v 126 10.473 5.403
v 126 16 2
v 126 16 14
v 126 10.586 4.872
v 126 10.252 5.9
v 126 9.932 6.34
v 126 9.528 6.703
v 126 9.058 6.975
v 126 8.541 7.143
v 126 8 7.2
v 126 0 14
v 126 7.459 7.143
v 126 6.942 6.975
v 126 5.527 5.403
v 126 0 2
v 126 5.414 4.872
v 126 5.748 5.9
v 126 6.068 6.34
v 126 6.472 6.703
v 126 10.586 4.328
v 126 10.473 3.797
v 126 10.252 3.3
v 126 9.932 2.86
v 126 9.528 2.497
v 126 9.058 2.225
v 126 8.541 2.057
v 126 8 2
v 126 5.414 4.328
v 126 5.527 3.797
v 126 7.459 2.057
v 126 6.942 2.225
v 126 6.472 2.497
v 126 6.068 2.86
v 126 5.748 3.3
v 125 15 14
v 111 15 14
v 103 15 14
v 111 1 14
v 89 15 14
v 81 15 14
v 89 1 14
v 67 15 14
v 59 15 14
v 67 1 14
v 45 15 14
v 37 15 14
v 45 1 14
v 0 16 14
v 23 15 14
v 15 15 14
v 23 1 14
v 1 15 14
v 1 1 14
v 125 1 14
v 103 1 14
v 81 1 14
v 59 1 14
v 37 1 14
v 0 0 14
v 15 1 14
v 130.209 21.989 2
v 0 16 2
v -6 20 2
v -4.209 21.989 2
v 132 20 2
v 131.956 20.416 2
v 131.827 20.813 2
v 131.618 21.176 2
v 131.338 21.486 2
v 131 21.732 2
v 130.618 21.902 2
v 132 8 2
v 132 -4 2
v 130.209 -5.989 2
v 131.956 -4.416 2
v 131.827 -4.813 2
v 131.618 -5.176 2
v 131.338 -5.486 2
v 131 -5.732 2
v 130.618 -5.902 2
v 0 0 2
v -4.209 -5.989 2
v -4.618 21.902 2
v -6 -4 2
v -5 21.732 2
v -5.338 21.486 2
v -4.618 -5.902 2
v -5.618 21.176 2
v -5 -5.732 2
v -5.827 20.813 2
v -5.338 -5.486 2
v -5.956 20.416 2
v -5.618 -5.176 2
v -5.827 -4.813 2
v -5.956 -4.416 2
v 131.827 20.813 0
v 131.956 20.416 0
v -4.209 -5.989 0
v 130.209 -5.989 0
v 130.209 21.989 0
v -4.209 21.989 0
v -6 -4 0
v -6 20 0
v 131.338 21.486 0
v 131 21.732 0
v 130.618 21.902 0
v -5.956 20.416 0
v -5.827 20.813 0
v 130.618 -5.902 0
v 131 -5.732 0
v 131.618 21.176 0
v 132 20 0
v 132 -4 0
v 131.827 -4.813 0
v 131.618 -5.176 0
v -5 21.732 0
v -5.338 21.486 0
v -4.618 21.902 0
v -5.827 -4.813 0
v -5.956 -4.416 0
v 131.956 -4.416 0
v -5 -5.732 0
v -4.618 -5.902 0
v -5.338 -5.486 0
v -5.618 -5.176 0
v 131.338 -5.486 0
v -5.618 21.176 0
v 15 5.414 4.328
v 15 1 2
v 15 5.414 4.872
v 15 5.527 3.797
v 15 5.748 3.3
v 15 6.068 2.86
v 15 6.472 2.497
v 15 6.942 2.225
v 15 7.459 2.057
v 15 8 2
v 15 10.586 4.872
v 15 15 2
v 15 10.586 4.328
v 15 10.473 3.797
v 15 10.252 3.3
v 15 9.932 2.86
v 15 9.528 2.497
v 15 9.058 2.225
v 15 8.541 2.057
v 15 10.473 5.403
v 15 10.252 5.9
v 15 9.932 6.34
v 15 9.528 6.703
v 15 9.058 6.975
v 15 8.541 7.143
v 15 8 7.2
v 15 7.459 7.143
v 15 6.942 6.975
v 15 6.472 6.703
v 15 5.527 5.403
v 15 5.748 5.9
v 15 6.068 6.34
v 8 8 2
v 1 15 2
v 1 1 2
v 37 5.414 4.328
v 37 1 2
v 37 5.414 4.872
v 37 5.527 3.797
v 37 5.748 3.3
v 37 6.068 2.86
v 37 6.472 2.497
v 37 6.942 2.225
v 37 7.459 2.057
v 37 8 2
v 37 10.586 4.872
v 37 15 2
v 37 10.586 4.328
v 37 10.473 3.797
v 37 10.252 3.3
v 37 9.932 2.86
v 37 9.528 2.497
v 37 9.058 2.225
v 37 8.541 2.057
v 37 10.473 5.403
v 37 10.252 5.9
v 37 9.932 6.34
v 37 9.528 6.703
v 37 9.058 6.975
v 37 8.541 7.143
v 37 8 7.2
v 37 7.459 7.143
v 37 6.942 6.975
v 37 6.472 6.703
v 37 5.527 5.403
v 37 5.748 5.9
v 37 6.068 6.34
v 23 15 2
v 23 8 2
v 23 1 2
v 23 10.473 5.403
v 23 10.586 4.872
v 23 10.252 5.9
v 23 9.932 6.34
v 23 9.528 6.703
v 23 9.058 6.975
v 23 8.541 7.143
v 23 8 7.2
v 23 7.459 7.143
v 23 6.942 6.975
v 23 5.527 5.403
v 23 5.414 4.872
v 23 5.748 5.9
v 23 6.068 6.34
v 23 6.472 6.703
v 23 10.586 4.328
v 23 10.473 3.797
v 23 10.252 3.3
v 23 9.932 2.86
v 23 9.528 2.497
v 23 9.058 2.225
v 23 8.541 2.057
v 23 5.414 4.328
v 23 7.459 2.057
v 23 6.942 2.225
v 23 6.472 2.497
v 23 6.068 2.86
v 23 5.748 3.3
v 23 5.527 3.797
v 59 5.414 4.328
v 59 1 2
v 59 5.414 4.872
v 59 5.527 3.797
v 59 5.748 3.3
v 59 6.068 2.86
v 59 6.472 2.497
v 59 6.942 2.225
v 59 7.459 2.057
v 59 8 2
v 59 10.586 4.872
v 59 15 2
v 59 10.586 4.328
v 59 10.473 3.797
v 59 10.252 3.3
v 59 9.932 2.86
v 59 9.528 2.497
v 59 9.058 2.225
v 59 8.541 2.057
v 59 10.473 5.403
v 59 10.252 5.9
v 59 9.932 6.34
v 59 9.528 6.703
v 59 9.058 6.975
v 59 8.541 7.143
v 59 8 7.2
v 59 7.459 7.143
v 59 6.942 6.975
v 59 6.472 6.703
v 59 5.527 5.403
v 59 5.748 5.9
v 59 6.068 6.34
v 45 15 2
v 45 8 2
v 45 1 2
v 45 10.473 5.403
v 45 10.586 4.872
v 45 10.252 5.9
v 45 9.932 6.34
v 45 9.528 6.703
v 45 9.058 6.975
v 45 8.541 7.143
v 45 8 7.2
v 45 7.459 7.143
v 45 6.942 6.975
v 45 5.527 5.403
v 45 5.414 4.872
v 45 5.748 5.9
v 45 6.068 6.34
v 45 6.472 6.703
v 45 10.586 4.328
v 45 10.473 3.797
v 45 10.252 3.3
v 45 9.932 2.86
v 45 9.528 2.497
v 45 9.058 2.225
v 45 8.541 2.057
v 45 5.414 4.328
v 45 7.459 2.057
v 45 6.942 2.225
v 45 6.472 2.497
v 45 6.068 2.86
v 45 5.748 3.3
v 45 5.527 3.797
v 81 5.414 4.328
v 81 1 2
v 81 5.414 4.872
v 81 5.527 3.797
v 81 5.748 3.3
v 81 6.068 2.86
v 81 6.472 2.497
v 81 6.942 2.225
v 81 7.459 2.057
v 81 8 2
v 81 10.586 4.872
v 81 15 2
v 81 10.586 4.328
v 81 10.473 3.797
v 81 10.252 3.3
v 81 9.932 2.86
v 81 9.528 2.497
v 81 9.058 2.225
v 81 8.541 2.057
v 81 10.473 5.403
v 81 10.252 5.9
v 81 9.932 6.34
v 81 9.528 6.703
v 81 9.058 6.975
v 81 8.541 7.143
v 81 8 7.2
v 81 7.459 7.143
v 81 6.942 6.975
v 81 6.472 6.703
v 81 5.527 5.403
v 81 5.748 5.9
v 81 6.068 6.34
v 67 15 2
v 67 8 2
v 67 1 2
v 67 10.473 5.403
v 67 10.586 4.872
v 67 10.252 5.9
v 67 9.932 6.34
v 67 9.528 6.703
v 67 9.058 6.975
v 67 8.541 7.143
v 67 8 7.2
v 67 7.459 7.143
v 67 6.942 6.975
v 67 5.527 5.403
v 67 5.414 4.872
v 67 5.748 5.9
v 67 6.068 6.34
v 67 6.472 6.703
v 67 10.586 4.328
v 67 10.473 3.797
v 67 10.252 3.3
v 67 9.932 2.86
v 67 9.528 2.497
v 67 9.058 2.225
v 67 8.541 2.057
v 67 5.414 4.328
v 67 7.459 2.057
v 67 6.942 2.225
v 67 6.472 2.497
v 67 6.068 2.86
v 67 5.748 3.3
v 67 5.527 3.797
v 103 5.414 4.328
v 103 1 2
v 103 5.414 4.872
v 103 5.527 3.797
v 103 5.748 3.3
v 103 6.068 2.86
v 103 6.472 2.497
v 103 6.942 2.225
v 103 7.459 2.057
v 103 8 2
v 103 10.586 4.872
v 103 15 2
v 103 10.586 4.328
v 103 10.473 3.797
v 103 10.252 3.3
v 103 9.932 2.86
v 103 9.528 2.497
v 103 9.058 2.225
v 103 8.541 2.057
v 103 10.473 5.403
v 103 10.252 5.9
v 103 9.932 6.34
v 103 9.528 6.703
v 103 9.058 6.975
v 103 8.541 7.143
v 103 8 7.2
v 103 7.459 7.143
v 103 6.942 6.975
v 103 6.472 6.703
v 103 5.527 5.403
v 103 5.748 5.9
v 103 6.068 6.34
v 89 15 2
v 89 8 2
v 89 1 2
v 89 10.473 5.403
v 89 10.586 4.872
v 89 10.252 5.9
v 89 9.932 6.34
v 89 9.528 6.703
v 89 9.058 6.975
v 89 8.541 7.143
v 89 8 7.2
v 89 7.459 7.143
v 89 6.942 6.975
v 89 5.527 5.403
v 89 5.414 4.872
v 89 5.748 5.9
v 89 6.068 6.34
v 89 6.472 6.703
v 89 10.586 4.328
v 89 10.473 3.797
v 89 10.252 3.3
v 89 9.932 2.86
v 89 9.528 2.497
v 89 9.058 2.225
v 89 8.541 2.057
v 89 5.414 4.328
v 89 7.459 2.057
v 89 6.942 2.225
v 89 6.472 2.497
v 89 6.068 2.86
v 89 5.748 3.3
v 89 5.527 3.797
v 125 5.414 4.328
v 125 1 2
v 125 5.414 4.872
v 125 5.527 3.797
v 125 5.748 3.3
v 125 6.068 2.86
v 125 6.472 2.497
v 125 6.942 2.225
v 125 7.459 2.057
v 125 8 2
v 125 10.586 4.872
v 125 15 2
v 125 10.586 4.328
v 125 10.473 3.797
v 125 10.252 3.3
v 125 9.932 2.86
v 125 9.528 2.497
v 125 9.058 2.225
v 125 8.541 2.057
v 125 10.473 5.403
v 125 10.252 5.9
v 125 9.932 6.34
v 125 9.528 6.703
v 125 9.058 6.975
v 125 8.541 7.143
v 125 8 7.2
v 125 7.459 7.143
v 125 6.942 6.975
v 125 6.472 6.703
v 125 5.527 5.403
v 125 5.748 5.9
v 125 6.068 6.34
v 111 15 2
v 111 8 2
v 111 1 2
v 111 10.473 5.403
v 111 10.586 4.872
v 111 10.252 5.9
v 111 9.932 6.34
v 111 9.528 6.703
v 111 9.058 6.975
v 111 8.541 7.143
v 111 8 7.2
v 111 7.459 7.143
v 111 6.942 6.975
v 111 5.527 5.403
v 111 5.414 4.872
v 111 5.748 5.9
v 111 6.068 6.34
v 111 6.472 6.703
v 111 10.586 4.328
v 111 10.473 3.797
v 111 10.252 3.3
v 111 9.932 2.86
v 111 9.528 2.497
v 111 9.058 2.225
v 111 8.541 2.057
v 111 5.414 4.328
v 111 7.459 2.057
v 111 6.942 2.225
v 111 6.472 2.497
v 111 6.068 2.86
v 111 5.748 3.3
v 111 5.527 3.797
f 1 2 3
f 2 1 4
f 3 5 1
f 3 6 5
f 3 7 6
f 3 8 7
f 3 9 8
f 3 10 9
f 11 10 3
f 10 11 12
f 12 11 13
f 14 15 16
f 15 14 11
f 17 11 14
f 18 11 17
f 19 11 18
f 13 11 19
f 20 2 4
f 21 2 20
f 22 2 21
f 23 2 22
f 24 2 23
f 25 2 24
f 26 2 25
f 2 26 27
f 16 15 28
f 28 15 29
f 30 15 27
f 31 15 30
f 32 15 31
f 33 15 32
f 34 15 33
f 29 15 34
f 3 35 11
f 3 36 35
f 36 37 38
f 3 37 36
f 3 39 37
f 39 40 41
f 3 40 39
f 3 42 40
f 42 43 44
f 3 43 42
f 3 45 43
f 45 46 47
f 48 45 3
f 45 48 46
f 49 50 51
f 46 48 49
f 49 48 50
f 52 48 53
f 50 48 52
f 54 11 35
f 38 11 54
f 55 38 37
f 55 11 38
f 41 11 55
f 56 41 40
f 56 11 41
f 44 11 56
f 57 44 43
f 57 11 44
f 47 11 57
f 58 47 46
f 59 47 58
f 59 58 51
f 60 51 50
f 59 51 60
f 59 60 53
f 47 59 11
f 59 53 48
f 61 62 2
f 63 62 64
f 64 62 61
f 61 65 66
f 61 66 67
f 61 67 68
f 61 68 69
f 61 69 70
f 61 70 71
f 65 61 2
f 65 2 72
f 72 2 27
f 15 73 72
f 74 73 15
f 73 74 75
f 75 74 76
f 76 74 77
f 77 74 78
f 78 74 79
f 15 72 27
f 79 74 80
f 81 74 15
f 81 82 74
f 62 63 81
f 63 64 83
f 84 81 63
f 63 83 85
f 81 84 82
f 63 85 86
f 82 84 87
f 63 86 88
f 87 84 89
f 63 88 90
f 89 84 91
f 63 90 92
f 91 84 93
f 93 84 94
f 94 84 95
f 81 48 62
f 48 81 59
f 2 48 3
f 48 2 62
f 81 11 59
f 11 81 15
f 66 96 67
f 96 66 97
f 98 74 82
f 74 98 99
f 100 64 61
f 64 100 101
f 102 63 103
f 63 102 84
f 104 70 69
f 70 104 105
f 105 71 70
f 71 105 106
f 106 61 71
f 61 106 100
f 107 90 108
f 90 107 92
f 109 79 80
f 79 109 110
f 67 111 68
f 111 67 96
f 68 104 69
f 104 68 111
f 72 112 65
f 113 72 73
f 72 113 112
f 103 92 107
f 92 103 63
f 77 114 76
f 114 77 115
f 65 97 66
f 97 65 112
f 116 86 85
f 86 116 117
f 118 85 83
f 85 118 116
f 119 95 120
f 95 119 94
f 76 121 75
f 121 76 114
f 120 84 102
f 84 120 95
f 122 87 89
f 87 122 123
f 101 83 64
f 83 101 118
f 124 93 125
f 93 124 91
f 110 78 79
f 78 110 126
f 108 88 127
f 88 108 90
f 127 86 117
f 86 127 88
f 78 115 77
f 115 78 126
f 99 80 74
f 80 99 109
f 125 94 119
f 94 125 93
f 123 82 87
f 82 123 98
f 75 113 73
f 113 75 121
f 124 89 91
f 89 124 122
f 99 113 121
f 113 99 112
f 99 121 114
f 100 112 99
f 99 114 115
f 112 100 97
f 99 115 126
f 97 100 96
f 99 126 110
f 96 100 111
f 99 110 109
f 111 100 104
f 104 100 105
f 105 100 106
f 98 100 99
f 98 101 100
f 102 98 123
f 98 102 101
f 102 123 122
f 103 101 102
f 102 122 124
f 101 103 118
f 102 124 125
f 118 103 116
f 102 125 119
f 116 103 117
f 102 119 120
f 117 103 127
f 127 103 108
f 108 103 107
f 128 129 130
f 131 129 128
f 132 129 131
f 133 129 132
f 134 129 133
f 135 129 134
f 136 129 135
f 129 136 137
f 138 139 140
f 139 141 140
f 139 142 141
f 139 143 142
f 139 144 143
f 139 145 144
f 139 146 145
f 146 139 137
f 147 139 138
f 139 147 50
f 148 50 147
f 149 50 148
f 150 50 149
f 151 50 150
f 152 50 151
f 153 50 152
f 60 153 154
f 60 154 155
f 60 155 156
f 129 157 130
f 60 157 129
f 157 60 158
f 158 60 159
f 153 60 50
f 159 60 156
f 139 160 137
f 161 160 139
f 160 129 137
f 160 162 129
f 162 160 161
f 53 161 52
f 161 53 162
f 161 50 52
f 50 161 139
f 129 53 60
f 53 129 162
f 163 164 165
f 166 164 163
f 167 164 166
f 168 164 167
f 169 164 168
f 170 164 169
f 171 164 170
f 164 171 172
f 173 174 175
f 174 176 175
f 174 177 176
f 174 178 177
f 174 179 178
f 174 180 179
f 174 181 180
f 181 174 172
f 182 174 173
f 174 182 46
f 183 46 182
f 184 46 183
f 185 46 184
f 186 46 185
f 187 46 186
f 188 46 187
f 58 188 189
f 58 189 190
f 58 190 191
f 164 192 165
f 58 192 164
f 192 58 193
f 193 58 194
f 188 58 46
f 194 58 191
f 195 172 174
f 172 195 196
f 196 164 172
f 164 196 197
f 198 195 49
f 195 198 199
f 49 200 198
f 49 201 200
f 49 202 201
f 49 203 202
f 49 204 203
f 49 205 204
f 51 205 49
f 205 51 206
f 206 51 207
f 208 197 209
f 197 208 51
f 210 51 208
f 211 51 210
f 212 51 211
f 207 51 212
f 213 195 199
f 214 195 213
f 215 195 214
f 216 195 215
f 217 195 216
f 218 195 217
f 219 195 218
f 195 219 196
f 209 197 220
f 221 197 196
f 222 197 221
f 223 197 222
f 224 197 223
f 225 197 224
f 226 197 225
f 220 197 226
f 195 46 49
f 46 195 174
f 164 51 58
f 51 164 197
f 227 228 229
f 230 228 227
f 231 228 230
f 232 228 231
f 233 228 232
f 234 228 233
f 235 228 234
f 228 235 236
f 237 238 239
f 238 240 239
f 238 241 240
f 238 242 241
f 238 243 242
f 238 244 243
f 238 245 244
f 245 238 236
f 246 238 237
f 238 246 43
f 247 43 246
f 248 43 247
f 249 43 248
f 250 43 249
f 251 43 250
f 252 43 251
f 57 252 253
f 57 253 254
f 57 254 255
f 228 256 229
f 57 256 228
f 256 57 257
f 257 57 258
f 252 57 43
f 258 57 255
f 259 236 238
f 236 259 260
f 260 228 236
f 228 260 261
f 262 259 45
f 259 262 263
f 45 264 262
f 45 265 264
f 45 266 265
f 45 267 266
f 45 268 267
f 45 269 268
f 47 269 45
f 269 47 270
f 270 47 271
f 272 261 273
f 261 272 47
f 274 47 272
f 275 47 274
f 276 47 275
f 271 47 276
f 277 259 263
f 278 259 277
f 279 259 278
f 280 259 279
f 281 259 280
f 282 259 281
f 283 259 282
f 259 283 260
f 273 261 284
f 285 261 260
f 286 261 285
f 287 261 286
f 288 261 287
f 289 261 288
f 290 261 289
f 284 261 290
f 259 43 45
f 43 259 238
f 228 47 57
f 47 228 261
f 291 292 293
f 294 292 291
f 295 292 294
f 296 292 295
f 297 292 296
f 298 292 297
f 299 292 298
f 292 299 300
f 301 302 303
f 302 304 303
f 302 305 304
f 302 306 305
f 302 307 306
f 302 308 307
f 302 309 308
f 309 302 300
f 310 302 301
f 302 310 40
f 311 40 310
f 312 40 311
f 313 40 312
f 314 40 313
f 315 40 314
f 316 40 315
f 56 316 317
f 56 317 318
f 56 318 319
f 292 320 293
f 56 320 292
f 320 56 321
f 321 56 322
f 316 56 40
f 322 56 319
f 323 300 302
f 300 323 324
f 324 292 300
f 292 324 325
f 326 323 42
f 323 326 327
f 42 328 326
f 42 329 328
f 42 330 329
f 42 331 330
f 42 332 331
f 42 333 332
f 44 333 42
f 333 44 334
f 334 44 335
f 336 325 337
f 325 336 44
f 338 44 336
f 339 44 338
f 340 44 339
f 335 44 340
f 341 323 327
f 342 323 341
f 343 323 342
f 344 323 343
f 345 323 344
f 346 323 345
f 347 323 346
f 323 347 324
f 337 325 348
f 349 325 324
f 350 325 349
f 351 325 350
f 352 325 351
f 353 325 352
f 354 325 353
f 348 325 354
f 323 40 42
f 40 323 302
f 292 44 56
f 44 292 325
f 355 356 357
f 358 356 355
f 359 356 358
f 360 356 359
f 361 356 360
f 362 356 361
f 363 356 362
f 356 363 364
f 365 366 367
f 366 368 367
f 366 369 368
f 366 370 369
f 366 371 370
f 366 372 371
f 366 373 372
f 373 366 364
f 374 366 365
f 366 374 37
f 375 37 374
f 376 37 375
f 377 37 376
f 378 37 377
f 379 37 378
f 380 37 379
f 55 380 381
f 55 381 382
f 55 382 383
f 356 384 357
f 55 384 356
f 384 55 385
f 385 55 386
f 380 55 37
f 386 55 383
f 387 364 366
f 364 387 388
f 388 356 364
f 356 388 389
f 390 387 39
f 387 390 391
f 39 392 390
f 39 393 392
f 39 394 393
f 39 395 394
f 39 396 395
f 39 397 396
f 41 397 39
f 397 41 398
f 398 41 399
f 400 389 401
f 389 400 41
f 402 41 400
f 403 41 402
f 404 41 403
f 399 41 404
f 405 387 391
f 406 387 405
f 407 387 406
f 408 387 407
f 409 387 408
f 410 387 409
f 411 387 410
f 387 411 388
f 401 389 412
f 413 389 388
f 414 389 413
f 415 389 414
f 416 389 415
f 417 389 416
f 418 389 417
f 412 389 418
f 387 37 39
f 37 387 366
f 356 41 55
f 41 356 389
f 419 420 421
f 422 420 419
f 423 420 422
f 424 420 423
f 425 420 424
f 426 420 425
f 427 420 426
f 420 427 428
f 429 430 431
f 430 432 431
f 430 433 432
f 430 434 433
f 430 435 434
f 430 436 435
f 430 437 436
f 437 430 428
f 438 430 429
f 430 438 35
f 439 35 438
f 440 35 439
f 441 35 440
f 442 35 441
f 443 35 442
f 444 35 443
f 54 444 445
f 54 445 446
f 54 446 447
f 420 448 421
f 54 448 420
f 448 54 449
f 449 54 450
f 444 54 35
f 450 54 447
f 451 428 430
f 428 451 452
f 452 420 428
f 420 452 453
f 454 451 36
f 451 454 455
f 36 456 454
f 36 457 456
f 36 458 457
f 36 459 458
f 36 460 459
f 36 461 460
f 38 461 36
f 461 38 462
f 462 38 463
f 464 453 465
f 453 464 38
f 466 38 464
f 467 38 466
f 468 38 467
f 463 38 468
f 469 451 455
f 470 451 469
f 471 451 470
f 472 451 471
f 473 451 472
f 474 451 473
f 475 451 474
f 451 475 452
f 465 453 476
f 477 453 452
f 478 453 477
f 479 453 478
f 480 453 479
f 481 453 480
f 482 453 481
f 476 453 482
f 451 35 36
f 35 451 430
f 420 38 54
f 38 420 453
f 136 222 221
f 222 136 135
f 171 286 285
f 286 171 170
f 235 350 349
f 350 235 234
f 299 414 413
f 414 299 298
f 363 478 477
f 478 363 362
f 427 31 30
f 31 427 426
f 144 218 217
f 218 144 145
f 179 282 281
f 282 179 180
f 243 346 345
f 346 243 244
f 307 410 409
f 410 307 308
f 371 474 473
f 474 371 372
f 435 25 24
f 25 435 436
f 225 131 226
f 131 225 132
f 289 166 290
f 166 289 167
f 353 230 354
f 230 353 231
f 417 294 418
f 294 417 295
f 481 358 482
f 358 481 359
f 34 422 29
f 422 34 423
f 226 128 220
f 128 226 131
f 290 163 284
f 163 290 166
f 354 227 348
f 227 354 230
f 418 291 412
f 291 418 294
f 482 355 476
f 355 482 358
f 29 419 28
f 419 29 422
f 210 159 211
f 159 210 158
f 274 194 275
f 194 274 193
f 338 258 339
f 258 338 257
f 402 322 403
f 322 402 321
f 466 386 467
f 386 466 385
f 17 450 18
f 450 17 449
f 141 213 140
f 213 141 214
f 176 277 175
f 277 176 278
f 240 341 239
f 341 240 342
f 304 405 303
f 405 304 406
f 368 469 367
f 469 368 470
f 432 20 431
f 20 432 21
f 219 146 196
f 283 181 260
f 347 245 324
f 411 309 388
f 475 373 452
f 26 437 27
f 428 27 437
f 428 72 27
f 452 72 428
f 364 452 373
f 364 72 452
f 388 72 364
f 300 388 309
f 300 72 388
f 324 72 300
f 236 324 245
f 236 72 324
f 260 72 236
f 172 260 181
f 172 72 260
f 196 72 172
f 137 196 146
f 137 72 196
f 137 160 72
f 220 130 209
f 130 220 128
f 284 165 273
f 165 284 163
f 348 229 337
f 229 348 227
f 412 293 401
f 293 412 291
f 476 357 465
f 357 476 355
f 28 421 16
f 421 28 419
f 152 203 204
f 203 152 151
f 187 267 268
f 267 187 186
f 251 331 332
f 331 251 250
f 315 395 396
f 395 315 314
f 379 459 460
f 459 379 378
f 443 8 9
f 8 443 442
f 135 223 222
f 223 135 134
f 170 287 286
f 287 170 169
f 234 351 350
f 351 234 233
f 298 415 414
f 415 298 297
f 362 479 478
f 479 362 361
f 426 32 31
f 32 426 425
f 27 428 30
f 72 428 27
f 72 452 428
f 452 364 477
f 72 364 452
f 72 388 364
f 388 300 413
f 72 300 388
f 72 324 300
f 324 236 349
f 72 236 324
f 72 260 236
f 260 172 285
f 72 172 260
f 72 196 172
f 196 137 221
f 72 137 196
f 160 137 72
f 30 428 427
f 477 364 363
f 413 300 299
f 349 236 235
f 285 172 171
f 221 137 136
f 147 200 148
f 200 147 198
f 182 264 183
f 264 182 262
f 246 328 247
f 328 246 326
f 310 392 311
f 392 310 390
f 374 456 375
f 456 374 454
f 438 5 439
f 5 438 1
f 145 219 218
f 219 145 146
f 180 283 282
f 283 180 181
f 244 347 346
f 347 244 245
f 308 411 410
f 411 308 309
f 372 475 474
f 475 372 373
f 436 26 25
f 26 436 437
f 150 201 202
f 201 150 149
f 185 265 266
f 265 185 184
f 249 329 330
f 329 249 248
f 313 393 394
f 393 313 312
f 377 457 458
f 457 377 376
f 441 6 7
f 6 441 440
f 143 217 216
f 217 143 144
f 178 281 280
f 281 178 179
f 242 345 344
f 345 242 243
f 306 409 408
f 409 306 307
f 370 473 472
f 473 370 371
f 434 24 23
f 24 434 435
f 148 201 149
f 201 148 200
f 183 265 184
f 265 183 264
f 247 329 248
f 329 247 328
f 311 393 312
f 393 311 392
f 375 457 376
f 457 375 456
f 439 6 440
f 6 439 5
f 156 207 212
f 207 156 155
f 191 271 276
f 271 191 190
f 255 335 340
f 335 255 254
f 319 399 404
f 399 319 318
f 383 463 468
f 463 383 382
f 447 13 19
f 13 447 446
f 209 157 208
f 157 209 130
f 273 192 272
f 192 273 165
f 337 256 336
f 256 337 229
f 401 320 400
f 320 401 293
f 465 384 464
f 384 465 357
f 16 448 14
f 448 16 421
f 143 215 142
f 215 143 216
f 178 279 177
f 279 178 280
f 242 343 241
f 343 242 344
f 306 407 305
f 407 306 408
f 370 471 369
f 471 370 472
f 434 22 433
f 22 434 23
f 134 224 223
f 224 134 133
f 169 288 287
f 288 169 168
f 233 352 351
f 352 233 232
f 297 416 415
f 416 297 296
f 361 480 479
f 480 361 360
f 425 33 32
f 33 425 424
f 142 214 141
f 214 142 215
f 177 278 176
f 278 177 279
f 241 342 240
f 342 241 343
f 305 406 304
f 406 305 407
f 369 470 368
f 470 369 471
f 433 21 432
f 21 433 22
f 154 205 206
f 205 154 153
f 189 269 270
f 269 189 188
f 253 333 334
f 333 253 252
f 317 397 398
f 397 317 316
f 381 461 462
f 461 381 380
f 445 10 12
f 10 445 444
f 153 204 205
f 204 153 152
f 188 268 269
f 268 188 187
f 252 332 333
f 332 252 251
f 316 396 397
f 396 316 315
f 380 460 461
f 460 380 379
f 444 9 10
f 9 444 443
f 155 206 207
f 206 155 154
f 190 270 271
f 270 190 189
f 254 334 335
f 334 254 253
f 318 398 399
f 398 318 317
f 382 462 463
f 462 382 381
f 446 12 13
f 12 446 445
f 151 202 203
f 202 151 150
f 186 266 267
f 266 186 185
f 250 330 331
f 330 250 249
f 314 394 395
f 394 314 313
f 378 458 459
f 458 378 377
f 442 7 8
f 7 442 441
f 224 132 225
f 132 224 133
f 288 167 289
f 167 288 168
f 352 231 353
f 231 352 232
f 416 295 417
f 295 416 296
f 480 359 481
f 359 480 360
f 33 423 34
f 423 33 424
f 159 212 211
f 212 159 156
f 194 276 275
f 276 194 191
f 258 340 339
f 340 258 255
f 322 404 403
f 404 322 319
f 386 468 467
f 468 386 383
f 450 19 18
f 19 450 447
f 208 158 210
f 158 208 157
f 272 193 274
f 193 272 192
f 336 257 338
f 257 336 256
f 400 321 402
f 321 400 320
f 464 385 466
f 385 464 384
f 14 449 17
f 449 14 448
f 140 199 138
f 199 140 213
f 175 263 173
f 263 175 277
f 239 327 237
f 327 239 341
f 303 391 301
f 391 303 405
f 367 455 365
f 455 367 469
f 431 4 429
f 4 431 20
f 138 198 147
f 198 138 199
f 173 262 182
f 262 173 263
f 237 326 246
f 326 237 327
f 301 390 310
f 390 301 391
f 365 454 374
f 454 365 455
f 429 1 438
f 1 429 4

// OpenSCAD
// Minimum Face Size
$fs = 0.3;

// Wall Thickness
wall_thickness = 1;

// Hole Diameter
hole_diameter = 5.2;
hole_radius = hole_diameter/2;

// Switch Base Size
switch_base_size = 14;

// Switch Count
switch_count = 6;

// Switch Hole Depth
switch_hole_depth = 9.5;

// Base Height
base_height = 12;

// Skirt Height
skirt_height = 2;

// Skirt Offset
skirt_offset = 6;

// Skirt Radius
skirt_radius = 2;

// Switch Spacing
switch_spacing = 6;


base_y = (switch_base_size + (wall_thickness * 2));
base_x = ((switch_base_size + (wall_thickness * 2)) * switch_count) + (switch_spacing * (switch_count - 1));
switch_padding = ((switch_base_size + (wall_thickness * 2)) - switch_base_size);

// base
module base() {
  translate([0 - (switch_padding/2), 0 - (switch_padding/2), 0]) {
    cube([base_x,base_y,base_height], false);
  }
}

// switch holes
module switch_holes() {
  for(i = [0:switch_count-1]) {
    translate([i * (switch_base_size + (wall_thickness * 2) + switch_spacing), 0, 0]) {
      cube(switch_base_size, false);
    }
  }
}

module skirt(offset, height, radius) {
  offset = (offset * 2) - (radius * 2);
  translate([0 - (switch_padding/2) - (offset/2), 0 - (switch_padding/2) - (offset/2), 0]) {
    linear_extrude(height) {
      minkowski() {
        square([base_x + offset, base_y + offset], false);
        circle(r = radius, center = true);
      }
    }
  }
}

// assembly
translate([switch_padding/2, switch_padding/2, 0]) {
  difference() {
    union() {
      translate([0, 0, skirt_height]) {
        base();
      }
      skirt(skirt_offset, skirt_height, skirt_radius);
    }
    translate([0, 0, skirt_height]) {
      switch_holes();
    }
    translate([(base_x/2) + switch_base_size/2, (base_y/2) - (switch_padding/2), skirt_height + hole_radius]) {
      rotate([0, 90, 0]) {
        cylinder(h = base_x, d = hole_diameter, center = true);
      }
    }
  }
}
